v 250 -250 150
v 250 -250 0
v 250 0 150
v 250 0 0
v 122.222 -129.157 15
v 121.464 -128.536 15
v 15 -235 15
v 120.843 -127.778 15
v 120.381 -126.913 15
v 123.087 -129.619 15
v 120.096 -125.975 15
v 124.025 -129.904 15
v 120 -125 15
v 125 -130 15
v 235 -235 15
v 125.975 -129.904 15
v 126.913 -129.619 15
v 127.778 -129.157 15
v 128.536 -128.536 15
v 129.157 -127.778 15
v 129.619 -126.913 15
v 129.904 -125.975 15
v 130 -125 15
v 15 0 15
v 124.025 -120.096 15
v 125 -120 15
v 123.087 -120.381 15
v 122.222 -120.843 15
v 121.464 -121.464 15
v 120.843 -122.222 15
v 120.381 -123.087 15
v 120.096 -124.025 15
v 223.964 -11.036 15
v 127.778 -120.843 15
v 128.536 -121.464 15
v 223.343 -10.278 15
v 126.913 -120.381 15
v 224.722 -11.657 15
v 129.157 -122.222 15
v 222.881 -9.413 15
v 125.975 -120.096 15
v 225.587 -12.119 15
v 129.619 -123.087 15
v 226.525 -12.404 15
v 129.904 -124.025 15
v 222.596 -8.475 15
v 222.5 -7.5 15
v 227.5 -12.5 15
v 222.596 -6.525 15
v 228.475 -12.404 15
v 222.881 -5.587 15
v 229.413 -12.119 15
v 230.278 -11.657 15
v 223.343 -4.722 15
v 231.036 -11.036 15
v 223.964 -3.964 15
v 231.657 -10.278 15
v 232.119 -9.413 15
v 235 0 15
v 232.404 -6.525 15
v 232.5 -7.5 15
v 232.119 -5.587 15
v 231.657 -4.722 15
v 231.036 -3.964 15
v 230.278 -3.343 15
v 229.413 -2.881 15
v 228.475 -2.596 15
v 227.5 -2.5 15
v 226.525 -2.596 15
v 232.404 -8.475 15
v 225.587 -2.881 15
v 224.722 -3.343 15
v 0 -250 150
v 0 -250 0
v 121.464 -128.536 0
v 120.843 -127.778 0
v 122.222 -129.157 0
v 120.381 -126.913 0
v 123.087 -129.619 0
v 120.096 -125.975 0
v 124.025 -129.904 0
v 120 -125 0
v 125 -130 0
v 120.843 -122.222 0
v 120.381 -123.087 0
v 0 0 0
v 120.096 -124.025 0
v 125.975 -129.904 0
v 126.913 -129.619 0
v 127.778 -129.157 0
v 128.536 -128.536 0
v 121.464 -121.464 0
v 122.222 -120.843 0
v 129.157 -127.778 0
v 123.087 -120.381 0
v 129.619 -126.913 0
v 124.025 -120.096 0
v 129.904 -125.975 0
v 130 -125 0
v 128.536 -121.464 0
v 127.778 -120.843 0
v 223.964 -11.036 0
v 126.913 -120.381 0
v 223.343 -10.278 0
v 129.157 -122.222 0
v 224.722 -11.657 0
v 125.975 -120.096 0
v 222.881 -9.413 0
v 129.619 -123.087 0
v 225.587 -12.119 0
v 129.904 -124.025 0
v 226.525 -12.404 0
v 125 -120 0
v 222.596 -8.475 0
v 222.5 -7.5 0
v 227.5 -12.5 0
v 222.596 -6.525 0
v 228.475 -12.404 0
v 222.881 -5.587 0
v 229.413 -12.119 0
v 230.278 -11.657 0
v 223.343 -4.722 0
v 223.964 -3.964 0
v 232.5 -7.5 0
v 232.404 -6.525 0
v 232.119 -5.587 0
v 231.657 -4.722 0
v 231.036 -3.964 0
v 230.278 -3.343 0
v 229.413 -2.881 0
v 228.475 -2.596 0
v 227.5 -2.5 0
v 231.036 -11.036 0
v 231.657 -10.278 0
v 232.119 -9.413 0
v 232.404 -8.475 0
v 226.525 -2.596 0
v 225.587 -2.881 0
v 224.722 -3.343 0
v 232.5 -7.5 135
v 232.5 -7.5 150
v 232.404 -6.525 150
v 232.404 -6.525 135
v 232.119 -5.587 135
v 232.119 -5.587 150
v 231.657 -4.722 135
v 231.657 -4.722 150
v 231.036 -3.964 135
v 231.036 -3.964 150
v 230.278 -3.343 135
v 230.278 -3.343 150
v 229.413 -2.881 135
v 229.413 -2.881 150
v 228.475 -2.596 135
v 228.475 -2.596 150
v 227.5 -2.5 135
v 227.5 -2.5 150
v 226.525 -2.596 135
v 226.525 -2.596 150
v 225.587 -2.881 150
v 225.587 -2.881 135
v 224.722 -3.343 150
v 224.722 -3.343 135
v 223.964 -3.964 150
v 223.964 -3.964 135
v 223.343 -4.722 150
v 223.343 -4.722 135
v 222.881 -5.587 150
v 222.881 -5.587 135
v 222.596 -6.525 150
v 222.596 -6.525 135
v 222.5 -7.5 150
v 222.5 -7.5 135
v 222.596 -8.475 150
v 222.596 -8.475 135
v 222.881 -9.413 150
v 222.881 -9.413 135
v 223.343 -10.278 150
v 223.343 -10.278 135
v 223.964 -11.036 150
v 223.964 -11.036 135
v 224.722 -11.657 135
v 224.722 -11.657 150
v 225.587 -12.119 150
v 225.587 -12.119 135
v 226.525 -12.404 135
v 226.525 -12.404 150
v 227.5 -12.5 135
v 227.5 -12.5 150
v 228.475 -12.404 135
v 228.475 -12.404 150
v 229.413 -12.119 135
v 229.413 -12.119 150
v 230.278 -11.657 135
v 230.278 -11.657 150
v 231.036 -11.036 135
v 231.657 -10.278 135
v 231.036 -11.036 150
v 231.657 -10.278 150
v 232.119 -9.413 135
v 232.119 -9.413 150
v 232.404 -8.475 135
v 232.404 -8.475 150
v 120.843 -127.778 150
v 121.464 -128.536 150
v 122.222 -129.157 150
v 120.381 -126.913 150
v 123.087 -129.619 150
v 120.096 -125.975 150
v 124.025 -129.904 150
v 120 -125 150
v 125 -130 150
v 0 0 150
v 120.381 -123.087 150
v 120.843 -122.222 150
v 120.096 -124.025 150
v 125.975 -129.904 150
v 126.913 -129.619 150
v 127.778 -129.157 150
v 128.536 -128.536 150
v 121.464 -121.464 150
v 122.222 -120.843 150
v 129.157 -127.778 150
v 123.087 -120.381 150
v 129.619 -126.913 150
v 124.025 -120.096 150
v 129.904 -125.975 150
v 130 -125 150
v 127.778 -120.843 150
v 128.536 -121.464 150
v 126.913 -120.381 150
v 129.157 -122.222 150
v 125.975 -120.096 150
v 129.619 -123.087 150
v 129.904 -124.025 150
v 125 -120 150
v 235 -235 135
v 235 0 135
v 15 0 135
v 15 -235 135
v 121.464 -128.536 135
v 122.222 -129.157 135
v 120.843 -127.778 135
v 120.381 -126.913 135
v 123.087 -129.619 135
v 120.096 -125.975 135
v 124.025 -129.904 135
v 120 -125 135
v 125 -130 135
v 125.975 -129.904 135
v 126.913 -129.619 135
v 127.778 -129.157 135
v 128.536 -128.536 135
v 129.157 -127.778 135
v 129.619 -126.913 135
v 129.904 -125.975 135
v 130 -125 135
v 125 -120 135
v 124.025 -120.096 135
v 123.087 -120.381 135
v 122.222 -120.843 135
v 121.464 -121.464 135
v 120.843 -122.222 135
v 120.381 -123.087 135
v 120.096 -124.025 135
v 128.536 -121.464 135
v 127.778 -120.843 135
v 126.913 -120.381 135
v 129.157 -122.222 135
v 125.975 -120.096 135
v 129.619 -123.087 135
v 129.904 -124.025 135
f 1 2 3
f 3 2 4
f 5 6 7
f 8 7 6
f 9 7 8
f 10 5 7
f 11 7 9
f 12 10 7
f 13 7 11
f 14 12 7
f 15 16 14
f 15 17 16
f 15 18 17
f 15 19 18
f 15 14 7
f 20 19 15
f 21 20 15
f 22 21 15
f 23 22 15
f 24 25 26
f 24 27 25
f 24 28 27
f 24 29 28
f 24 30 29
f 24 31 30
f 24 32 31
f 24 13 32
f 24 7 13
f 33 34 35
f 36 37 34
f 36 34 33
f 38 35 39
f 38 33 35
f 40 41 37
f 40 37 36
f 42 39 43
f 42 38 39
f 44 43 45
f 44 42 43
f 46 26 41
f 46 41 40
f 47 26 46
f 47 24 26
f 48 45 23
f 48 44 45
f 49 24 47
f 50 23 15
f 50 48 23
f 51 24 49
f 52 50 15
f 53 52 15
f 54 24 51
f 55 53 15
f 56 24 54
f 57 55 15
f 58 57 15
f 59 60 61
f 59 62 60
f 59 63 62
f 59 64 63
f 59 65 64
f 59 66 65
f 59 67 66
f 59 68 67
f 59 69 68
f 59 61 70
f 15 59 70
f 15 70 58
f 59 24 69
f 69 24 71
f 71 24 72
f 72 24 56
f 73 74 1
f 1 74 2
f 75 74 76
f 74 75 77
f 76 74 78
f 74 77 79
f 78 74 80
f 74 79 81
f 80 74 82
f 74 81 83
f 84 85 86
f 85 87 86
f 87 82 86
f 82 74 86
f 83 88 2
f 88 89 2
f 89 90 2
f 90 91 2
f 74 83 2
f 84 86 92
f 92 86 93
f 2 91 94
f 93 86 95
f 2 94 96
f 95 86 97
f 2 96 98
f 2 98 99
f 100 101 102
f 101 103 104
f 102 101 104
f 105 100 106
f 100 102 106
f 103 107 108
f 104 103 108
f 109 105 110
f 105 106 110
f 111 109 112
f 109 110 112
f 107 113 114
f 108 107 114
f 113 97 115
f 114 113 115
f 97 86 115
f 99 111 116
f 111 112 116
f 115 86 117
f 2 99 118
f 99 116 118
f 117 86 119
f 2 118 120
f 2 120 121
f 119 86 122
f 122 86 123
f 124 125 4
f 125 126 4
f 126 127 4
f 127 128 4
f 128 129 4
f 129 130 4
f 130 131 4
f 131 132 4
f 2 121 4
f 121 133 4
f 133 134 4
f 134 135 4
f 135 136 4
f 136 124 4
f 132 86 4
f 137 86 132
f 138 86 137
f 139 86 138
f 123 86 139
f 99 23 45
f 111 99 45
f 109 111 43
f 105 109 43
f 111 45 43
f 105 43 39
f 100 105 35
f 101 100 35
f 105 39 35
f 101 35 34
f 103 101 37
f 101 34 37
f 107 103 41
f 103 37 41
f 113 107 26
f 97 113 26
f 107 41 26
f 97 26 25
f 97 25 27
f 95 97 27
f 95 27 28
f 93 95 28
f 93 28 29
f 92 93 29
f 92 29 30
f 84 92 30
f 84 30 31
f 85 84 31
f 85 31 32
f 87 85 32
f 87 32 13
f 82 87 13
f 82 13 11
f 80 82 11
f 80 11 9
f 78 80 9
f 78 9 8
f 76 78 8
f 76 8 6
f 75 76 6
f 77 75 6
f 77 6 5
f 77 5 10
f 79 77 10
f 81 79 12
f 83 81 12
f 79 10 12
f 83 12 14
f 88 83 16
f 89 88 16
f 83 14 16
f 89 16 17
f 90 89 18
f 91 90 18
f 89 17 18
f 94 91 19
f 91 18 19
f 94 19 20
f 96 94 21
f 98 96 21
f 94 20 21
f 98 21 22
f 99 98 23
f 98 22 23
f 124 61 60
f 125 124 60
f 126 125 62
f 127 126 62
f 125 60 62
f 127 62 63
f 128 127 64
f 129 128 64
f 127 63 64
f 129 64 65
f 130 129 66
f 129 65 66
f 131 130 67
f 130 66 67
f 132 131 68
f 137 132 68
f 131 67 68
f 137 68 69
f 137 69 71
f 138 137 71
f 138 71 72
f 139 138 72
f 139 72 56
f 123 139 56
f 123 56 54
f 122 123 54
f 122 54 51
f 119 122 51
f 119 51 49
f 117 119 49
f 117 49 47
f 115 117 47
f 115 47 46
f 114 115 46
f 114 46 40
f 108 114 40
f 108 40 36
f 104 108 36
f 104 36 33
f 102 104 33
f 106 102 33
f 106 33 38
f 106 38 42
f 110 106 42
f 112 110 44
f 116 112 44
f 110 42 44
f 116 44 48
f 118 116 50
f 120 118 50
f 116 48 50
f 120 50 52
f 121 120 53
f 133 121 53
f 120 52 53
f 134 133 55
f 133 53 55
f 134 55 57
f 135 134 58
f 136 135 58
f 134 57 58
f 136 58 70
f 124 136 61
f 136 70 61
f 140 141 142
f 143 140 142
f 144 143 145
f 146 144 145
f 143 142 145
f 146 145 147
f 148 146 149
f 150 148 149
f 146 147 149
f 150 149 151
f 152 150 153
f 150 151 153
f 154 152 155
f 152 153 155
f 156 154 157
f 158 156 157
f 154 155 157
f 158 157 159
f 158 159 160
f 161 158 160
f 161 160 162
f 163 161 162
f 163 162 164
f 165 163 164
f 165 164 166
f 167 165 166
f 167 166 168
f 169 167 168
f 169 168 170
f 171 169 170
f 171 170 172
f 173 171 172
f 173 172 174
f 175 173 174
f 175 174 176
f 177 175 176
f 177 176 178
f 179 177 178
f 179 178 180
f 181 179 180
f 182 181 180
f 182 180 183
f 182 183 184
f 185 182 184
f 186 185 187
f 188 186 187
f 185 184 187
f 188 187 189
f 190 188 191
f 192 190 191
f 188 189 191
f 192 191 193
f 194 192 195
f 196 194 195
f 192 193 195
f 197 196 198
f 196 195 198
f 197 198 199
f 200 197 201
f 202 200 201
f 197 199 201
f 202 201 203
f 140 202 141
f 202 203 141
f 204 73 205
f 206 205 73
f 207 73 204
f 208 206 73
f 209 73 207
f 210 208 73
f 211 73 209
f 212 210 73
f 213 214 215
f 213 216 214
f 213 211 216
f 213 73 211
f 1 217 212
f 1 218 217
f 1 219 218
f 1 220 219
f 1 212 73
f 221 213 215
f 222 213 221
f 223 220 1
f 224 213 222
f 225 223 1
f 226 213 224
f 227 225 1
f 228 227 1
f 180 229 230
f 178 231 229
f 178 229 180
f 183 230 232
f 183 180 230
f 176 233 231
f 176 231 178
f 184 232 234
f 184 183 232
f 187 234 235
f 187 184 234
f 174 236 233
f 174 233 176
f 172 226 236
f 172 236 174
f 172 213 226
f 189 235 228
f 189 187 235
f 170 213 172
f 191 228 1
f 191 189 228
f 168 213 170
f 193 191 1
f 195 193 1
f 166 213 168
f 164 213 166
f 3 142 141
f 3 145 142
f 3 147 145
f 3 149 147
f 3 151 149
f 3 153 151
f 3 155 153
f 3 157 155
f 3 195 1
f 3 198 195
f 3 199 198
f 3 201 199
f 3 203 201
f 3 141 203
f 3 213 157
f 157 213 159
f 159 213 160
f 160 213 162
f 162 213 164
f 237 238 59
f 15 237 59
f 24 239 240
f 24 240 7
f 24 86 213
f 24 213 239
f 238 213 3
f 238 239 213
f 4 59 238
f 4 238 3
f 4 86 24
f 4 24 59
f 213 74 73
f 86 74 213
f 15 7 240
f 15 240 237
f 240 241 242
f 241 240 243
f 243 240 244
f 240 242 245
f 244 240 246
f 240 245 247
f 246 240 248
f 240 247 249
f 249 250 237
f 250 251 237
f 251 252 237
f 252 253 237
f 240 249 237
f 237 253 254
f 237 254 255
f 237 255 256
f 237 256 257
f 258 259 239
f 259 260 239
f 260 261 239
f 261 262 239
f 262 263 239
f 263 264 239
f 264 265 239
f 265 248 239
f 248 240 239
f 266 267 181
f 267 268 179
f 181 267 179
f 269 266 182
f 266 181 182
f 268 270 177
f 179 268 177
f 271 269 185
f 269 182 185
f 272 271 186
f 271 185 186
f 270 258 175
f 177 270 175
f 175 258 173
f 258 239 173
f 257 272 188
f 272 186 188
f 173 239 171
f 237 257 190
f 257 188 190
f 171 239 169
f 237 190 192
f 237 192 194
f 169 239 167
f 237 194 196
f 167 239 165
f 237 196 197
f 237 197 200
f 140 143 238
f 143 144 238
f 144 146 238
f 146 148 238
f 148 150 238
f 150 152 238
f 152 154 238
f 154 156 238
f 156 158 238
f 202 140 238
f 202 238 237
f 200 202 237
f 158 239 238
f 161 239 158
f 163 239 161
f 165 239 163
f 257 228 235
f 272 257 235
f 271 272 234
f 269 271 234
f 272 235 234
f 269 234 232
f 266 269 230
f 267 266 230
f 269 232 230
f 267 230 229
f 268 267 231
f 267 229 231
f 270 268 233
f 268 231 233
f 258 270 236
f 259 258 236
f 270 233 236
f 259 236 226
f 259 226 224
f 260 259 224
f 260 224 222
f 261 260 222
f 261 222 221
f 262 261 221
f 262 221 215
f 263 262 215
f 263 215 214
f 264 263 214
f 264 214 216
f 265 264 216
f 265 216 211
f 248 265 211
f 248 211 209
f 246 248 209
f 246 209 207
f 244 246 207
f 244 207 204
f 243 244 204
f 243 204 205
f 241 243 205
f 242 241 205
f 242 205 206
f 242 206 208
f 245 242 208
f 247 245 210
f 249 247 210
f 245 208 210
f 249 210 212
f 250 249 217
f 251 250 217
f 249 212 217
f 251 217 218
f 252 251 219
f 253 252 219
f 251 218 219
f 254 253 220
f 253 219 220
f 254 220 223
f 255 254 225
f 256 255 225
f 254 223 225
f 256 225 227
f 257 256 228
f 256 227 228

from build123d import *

# Parameters (mm, degrees)
SKETCH1_W           = 250
SKETCH1_H           = 250
BOSS_EXTRUDE1_DEPTH = 150
SKETCH2_W           = 220
SKETCH2_H           = 120
CUT_EXTRUDE1_DEPTH  = 235
SKETCH3_R           = 5
CUT_EXTRUDE5_DEPTH  = 235


with BuildPart() as part:
    # Sketch1 → Boss-Extrude1 (new body)
    with BuildSketch(Plane.XY):
        with Locations((125, -125)):
            Rectangle(SKETCH1_W, SKETCH1_H)
    extrude(amount=BOSS_EXTRUDE1_DEPTH)

    # Sketch2 → Cut-Extrude1 (cut)
    with BuildSketch(Plane(origin=(0, 0, 0), x_dir=(1, 0, 0), z_dir=(0, 1, 0))):
        with Locations((125, -75)):
            Rectangle(SKETCH2_W, SKETCH2_H)
    extrude(amount=-CUT_EXTRUDE1_DEPTH, mode=Mode.SUBTRACT)

    # Sketch3 → Cut-Extrude5 (cut)
    with BuildSketch(Plane.XY.offset(150)):
        with Locations((125, -125)):
            Circle(SKETCH3_R)
        with Locations((227.5, -7.5)):
            Circle(SKETCH3_R)
    extrude(amount=-CUT_EXTRUDE5_DEPTH, mode=Mode.SUBTRACT)


solid = part.part
